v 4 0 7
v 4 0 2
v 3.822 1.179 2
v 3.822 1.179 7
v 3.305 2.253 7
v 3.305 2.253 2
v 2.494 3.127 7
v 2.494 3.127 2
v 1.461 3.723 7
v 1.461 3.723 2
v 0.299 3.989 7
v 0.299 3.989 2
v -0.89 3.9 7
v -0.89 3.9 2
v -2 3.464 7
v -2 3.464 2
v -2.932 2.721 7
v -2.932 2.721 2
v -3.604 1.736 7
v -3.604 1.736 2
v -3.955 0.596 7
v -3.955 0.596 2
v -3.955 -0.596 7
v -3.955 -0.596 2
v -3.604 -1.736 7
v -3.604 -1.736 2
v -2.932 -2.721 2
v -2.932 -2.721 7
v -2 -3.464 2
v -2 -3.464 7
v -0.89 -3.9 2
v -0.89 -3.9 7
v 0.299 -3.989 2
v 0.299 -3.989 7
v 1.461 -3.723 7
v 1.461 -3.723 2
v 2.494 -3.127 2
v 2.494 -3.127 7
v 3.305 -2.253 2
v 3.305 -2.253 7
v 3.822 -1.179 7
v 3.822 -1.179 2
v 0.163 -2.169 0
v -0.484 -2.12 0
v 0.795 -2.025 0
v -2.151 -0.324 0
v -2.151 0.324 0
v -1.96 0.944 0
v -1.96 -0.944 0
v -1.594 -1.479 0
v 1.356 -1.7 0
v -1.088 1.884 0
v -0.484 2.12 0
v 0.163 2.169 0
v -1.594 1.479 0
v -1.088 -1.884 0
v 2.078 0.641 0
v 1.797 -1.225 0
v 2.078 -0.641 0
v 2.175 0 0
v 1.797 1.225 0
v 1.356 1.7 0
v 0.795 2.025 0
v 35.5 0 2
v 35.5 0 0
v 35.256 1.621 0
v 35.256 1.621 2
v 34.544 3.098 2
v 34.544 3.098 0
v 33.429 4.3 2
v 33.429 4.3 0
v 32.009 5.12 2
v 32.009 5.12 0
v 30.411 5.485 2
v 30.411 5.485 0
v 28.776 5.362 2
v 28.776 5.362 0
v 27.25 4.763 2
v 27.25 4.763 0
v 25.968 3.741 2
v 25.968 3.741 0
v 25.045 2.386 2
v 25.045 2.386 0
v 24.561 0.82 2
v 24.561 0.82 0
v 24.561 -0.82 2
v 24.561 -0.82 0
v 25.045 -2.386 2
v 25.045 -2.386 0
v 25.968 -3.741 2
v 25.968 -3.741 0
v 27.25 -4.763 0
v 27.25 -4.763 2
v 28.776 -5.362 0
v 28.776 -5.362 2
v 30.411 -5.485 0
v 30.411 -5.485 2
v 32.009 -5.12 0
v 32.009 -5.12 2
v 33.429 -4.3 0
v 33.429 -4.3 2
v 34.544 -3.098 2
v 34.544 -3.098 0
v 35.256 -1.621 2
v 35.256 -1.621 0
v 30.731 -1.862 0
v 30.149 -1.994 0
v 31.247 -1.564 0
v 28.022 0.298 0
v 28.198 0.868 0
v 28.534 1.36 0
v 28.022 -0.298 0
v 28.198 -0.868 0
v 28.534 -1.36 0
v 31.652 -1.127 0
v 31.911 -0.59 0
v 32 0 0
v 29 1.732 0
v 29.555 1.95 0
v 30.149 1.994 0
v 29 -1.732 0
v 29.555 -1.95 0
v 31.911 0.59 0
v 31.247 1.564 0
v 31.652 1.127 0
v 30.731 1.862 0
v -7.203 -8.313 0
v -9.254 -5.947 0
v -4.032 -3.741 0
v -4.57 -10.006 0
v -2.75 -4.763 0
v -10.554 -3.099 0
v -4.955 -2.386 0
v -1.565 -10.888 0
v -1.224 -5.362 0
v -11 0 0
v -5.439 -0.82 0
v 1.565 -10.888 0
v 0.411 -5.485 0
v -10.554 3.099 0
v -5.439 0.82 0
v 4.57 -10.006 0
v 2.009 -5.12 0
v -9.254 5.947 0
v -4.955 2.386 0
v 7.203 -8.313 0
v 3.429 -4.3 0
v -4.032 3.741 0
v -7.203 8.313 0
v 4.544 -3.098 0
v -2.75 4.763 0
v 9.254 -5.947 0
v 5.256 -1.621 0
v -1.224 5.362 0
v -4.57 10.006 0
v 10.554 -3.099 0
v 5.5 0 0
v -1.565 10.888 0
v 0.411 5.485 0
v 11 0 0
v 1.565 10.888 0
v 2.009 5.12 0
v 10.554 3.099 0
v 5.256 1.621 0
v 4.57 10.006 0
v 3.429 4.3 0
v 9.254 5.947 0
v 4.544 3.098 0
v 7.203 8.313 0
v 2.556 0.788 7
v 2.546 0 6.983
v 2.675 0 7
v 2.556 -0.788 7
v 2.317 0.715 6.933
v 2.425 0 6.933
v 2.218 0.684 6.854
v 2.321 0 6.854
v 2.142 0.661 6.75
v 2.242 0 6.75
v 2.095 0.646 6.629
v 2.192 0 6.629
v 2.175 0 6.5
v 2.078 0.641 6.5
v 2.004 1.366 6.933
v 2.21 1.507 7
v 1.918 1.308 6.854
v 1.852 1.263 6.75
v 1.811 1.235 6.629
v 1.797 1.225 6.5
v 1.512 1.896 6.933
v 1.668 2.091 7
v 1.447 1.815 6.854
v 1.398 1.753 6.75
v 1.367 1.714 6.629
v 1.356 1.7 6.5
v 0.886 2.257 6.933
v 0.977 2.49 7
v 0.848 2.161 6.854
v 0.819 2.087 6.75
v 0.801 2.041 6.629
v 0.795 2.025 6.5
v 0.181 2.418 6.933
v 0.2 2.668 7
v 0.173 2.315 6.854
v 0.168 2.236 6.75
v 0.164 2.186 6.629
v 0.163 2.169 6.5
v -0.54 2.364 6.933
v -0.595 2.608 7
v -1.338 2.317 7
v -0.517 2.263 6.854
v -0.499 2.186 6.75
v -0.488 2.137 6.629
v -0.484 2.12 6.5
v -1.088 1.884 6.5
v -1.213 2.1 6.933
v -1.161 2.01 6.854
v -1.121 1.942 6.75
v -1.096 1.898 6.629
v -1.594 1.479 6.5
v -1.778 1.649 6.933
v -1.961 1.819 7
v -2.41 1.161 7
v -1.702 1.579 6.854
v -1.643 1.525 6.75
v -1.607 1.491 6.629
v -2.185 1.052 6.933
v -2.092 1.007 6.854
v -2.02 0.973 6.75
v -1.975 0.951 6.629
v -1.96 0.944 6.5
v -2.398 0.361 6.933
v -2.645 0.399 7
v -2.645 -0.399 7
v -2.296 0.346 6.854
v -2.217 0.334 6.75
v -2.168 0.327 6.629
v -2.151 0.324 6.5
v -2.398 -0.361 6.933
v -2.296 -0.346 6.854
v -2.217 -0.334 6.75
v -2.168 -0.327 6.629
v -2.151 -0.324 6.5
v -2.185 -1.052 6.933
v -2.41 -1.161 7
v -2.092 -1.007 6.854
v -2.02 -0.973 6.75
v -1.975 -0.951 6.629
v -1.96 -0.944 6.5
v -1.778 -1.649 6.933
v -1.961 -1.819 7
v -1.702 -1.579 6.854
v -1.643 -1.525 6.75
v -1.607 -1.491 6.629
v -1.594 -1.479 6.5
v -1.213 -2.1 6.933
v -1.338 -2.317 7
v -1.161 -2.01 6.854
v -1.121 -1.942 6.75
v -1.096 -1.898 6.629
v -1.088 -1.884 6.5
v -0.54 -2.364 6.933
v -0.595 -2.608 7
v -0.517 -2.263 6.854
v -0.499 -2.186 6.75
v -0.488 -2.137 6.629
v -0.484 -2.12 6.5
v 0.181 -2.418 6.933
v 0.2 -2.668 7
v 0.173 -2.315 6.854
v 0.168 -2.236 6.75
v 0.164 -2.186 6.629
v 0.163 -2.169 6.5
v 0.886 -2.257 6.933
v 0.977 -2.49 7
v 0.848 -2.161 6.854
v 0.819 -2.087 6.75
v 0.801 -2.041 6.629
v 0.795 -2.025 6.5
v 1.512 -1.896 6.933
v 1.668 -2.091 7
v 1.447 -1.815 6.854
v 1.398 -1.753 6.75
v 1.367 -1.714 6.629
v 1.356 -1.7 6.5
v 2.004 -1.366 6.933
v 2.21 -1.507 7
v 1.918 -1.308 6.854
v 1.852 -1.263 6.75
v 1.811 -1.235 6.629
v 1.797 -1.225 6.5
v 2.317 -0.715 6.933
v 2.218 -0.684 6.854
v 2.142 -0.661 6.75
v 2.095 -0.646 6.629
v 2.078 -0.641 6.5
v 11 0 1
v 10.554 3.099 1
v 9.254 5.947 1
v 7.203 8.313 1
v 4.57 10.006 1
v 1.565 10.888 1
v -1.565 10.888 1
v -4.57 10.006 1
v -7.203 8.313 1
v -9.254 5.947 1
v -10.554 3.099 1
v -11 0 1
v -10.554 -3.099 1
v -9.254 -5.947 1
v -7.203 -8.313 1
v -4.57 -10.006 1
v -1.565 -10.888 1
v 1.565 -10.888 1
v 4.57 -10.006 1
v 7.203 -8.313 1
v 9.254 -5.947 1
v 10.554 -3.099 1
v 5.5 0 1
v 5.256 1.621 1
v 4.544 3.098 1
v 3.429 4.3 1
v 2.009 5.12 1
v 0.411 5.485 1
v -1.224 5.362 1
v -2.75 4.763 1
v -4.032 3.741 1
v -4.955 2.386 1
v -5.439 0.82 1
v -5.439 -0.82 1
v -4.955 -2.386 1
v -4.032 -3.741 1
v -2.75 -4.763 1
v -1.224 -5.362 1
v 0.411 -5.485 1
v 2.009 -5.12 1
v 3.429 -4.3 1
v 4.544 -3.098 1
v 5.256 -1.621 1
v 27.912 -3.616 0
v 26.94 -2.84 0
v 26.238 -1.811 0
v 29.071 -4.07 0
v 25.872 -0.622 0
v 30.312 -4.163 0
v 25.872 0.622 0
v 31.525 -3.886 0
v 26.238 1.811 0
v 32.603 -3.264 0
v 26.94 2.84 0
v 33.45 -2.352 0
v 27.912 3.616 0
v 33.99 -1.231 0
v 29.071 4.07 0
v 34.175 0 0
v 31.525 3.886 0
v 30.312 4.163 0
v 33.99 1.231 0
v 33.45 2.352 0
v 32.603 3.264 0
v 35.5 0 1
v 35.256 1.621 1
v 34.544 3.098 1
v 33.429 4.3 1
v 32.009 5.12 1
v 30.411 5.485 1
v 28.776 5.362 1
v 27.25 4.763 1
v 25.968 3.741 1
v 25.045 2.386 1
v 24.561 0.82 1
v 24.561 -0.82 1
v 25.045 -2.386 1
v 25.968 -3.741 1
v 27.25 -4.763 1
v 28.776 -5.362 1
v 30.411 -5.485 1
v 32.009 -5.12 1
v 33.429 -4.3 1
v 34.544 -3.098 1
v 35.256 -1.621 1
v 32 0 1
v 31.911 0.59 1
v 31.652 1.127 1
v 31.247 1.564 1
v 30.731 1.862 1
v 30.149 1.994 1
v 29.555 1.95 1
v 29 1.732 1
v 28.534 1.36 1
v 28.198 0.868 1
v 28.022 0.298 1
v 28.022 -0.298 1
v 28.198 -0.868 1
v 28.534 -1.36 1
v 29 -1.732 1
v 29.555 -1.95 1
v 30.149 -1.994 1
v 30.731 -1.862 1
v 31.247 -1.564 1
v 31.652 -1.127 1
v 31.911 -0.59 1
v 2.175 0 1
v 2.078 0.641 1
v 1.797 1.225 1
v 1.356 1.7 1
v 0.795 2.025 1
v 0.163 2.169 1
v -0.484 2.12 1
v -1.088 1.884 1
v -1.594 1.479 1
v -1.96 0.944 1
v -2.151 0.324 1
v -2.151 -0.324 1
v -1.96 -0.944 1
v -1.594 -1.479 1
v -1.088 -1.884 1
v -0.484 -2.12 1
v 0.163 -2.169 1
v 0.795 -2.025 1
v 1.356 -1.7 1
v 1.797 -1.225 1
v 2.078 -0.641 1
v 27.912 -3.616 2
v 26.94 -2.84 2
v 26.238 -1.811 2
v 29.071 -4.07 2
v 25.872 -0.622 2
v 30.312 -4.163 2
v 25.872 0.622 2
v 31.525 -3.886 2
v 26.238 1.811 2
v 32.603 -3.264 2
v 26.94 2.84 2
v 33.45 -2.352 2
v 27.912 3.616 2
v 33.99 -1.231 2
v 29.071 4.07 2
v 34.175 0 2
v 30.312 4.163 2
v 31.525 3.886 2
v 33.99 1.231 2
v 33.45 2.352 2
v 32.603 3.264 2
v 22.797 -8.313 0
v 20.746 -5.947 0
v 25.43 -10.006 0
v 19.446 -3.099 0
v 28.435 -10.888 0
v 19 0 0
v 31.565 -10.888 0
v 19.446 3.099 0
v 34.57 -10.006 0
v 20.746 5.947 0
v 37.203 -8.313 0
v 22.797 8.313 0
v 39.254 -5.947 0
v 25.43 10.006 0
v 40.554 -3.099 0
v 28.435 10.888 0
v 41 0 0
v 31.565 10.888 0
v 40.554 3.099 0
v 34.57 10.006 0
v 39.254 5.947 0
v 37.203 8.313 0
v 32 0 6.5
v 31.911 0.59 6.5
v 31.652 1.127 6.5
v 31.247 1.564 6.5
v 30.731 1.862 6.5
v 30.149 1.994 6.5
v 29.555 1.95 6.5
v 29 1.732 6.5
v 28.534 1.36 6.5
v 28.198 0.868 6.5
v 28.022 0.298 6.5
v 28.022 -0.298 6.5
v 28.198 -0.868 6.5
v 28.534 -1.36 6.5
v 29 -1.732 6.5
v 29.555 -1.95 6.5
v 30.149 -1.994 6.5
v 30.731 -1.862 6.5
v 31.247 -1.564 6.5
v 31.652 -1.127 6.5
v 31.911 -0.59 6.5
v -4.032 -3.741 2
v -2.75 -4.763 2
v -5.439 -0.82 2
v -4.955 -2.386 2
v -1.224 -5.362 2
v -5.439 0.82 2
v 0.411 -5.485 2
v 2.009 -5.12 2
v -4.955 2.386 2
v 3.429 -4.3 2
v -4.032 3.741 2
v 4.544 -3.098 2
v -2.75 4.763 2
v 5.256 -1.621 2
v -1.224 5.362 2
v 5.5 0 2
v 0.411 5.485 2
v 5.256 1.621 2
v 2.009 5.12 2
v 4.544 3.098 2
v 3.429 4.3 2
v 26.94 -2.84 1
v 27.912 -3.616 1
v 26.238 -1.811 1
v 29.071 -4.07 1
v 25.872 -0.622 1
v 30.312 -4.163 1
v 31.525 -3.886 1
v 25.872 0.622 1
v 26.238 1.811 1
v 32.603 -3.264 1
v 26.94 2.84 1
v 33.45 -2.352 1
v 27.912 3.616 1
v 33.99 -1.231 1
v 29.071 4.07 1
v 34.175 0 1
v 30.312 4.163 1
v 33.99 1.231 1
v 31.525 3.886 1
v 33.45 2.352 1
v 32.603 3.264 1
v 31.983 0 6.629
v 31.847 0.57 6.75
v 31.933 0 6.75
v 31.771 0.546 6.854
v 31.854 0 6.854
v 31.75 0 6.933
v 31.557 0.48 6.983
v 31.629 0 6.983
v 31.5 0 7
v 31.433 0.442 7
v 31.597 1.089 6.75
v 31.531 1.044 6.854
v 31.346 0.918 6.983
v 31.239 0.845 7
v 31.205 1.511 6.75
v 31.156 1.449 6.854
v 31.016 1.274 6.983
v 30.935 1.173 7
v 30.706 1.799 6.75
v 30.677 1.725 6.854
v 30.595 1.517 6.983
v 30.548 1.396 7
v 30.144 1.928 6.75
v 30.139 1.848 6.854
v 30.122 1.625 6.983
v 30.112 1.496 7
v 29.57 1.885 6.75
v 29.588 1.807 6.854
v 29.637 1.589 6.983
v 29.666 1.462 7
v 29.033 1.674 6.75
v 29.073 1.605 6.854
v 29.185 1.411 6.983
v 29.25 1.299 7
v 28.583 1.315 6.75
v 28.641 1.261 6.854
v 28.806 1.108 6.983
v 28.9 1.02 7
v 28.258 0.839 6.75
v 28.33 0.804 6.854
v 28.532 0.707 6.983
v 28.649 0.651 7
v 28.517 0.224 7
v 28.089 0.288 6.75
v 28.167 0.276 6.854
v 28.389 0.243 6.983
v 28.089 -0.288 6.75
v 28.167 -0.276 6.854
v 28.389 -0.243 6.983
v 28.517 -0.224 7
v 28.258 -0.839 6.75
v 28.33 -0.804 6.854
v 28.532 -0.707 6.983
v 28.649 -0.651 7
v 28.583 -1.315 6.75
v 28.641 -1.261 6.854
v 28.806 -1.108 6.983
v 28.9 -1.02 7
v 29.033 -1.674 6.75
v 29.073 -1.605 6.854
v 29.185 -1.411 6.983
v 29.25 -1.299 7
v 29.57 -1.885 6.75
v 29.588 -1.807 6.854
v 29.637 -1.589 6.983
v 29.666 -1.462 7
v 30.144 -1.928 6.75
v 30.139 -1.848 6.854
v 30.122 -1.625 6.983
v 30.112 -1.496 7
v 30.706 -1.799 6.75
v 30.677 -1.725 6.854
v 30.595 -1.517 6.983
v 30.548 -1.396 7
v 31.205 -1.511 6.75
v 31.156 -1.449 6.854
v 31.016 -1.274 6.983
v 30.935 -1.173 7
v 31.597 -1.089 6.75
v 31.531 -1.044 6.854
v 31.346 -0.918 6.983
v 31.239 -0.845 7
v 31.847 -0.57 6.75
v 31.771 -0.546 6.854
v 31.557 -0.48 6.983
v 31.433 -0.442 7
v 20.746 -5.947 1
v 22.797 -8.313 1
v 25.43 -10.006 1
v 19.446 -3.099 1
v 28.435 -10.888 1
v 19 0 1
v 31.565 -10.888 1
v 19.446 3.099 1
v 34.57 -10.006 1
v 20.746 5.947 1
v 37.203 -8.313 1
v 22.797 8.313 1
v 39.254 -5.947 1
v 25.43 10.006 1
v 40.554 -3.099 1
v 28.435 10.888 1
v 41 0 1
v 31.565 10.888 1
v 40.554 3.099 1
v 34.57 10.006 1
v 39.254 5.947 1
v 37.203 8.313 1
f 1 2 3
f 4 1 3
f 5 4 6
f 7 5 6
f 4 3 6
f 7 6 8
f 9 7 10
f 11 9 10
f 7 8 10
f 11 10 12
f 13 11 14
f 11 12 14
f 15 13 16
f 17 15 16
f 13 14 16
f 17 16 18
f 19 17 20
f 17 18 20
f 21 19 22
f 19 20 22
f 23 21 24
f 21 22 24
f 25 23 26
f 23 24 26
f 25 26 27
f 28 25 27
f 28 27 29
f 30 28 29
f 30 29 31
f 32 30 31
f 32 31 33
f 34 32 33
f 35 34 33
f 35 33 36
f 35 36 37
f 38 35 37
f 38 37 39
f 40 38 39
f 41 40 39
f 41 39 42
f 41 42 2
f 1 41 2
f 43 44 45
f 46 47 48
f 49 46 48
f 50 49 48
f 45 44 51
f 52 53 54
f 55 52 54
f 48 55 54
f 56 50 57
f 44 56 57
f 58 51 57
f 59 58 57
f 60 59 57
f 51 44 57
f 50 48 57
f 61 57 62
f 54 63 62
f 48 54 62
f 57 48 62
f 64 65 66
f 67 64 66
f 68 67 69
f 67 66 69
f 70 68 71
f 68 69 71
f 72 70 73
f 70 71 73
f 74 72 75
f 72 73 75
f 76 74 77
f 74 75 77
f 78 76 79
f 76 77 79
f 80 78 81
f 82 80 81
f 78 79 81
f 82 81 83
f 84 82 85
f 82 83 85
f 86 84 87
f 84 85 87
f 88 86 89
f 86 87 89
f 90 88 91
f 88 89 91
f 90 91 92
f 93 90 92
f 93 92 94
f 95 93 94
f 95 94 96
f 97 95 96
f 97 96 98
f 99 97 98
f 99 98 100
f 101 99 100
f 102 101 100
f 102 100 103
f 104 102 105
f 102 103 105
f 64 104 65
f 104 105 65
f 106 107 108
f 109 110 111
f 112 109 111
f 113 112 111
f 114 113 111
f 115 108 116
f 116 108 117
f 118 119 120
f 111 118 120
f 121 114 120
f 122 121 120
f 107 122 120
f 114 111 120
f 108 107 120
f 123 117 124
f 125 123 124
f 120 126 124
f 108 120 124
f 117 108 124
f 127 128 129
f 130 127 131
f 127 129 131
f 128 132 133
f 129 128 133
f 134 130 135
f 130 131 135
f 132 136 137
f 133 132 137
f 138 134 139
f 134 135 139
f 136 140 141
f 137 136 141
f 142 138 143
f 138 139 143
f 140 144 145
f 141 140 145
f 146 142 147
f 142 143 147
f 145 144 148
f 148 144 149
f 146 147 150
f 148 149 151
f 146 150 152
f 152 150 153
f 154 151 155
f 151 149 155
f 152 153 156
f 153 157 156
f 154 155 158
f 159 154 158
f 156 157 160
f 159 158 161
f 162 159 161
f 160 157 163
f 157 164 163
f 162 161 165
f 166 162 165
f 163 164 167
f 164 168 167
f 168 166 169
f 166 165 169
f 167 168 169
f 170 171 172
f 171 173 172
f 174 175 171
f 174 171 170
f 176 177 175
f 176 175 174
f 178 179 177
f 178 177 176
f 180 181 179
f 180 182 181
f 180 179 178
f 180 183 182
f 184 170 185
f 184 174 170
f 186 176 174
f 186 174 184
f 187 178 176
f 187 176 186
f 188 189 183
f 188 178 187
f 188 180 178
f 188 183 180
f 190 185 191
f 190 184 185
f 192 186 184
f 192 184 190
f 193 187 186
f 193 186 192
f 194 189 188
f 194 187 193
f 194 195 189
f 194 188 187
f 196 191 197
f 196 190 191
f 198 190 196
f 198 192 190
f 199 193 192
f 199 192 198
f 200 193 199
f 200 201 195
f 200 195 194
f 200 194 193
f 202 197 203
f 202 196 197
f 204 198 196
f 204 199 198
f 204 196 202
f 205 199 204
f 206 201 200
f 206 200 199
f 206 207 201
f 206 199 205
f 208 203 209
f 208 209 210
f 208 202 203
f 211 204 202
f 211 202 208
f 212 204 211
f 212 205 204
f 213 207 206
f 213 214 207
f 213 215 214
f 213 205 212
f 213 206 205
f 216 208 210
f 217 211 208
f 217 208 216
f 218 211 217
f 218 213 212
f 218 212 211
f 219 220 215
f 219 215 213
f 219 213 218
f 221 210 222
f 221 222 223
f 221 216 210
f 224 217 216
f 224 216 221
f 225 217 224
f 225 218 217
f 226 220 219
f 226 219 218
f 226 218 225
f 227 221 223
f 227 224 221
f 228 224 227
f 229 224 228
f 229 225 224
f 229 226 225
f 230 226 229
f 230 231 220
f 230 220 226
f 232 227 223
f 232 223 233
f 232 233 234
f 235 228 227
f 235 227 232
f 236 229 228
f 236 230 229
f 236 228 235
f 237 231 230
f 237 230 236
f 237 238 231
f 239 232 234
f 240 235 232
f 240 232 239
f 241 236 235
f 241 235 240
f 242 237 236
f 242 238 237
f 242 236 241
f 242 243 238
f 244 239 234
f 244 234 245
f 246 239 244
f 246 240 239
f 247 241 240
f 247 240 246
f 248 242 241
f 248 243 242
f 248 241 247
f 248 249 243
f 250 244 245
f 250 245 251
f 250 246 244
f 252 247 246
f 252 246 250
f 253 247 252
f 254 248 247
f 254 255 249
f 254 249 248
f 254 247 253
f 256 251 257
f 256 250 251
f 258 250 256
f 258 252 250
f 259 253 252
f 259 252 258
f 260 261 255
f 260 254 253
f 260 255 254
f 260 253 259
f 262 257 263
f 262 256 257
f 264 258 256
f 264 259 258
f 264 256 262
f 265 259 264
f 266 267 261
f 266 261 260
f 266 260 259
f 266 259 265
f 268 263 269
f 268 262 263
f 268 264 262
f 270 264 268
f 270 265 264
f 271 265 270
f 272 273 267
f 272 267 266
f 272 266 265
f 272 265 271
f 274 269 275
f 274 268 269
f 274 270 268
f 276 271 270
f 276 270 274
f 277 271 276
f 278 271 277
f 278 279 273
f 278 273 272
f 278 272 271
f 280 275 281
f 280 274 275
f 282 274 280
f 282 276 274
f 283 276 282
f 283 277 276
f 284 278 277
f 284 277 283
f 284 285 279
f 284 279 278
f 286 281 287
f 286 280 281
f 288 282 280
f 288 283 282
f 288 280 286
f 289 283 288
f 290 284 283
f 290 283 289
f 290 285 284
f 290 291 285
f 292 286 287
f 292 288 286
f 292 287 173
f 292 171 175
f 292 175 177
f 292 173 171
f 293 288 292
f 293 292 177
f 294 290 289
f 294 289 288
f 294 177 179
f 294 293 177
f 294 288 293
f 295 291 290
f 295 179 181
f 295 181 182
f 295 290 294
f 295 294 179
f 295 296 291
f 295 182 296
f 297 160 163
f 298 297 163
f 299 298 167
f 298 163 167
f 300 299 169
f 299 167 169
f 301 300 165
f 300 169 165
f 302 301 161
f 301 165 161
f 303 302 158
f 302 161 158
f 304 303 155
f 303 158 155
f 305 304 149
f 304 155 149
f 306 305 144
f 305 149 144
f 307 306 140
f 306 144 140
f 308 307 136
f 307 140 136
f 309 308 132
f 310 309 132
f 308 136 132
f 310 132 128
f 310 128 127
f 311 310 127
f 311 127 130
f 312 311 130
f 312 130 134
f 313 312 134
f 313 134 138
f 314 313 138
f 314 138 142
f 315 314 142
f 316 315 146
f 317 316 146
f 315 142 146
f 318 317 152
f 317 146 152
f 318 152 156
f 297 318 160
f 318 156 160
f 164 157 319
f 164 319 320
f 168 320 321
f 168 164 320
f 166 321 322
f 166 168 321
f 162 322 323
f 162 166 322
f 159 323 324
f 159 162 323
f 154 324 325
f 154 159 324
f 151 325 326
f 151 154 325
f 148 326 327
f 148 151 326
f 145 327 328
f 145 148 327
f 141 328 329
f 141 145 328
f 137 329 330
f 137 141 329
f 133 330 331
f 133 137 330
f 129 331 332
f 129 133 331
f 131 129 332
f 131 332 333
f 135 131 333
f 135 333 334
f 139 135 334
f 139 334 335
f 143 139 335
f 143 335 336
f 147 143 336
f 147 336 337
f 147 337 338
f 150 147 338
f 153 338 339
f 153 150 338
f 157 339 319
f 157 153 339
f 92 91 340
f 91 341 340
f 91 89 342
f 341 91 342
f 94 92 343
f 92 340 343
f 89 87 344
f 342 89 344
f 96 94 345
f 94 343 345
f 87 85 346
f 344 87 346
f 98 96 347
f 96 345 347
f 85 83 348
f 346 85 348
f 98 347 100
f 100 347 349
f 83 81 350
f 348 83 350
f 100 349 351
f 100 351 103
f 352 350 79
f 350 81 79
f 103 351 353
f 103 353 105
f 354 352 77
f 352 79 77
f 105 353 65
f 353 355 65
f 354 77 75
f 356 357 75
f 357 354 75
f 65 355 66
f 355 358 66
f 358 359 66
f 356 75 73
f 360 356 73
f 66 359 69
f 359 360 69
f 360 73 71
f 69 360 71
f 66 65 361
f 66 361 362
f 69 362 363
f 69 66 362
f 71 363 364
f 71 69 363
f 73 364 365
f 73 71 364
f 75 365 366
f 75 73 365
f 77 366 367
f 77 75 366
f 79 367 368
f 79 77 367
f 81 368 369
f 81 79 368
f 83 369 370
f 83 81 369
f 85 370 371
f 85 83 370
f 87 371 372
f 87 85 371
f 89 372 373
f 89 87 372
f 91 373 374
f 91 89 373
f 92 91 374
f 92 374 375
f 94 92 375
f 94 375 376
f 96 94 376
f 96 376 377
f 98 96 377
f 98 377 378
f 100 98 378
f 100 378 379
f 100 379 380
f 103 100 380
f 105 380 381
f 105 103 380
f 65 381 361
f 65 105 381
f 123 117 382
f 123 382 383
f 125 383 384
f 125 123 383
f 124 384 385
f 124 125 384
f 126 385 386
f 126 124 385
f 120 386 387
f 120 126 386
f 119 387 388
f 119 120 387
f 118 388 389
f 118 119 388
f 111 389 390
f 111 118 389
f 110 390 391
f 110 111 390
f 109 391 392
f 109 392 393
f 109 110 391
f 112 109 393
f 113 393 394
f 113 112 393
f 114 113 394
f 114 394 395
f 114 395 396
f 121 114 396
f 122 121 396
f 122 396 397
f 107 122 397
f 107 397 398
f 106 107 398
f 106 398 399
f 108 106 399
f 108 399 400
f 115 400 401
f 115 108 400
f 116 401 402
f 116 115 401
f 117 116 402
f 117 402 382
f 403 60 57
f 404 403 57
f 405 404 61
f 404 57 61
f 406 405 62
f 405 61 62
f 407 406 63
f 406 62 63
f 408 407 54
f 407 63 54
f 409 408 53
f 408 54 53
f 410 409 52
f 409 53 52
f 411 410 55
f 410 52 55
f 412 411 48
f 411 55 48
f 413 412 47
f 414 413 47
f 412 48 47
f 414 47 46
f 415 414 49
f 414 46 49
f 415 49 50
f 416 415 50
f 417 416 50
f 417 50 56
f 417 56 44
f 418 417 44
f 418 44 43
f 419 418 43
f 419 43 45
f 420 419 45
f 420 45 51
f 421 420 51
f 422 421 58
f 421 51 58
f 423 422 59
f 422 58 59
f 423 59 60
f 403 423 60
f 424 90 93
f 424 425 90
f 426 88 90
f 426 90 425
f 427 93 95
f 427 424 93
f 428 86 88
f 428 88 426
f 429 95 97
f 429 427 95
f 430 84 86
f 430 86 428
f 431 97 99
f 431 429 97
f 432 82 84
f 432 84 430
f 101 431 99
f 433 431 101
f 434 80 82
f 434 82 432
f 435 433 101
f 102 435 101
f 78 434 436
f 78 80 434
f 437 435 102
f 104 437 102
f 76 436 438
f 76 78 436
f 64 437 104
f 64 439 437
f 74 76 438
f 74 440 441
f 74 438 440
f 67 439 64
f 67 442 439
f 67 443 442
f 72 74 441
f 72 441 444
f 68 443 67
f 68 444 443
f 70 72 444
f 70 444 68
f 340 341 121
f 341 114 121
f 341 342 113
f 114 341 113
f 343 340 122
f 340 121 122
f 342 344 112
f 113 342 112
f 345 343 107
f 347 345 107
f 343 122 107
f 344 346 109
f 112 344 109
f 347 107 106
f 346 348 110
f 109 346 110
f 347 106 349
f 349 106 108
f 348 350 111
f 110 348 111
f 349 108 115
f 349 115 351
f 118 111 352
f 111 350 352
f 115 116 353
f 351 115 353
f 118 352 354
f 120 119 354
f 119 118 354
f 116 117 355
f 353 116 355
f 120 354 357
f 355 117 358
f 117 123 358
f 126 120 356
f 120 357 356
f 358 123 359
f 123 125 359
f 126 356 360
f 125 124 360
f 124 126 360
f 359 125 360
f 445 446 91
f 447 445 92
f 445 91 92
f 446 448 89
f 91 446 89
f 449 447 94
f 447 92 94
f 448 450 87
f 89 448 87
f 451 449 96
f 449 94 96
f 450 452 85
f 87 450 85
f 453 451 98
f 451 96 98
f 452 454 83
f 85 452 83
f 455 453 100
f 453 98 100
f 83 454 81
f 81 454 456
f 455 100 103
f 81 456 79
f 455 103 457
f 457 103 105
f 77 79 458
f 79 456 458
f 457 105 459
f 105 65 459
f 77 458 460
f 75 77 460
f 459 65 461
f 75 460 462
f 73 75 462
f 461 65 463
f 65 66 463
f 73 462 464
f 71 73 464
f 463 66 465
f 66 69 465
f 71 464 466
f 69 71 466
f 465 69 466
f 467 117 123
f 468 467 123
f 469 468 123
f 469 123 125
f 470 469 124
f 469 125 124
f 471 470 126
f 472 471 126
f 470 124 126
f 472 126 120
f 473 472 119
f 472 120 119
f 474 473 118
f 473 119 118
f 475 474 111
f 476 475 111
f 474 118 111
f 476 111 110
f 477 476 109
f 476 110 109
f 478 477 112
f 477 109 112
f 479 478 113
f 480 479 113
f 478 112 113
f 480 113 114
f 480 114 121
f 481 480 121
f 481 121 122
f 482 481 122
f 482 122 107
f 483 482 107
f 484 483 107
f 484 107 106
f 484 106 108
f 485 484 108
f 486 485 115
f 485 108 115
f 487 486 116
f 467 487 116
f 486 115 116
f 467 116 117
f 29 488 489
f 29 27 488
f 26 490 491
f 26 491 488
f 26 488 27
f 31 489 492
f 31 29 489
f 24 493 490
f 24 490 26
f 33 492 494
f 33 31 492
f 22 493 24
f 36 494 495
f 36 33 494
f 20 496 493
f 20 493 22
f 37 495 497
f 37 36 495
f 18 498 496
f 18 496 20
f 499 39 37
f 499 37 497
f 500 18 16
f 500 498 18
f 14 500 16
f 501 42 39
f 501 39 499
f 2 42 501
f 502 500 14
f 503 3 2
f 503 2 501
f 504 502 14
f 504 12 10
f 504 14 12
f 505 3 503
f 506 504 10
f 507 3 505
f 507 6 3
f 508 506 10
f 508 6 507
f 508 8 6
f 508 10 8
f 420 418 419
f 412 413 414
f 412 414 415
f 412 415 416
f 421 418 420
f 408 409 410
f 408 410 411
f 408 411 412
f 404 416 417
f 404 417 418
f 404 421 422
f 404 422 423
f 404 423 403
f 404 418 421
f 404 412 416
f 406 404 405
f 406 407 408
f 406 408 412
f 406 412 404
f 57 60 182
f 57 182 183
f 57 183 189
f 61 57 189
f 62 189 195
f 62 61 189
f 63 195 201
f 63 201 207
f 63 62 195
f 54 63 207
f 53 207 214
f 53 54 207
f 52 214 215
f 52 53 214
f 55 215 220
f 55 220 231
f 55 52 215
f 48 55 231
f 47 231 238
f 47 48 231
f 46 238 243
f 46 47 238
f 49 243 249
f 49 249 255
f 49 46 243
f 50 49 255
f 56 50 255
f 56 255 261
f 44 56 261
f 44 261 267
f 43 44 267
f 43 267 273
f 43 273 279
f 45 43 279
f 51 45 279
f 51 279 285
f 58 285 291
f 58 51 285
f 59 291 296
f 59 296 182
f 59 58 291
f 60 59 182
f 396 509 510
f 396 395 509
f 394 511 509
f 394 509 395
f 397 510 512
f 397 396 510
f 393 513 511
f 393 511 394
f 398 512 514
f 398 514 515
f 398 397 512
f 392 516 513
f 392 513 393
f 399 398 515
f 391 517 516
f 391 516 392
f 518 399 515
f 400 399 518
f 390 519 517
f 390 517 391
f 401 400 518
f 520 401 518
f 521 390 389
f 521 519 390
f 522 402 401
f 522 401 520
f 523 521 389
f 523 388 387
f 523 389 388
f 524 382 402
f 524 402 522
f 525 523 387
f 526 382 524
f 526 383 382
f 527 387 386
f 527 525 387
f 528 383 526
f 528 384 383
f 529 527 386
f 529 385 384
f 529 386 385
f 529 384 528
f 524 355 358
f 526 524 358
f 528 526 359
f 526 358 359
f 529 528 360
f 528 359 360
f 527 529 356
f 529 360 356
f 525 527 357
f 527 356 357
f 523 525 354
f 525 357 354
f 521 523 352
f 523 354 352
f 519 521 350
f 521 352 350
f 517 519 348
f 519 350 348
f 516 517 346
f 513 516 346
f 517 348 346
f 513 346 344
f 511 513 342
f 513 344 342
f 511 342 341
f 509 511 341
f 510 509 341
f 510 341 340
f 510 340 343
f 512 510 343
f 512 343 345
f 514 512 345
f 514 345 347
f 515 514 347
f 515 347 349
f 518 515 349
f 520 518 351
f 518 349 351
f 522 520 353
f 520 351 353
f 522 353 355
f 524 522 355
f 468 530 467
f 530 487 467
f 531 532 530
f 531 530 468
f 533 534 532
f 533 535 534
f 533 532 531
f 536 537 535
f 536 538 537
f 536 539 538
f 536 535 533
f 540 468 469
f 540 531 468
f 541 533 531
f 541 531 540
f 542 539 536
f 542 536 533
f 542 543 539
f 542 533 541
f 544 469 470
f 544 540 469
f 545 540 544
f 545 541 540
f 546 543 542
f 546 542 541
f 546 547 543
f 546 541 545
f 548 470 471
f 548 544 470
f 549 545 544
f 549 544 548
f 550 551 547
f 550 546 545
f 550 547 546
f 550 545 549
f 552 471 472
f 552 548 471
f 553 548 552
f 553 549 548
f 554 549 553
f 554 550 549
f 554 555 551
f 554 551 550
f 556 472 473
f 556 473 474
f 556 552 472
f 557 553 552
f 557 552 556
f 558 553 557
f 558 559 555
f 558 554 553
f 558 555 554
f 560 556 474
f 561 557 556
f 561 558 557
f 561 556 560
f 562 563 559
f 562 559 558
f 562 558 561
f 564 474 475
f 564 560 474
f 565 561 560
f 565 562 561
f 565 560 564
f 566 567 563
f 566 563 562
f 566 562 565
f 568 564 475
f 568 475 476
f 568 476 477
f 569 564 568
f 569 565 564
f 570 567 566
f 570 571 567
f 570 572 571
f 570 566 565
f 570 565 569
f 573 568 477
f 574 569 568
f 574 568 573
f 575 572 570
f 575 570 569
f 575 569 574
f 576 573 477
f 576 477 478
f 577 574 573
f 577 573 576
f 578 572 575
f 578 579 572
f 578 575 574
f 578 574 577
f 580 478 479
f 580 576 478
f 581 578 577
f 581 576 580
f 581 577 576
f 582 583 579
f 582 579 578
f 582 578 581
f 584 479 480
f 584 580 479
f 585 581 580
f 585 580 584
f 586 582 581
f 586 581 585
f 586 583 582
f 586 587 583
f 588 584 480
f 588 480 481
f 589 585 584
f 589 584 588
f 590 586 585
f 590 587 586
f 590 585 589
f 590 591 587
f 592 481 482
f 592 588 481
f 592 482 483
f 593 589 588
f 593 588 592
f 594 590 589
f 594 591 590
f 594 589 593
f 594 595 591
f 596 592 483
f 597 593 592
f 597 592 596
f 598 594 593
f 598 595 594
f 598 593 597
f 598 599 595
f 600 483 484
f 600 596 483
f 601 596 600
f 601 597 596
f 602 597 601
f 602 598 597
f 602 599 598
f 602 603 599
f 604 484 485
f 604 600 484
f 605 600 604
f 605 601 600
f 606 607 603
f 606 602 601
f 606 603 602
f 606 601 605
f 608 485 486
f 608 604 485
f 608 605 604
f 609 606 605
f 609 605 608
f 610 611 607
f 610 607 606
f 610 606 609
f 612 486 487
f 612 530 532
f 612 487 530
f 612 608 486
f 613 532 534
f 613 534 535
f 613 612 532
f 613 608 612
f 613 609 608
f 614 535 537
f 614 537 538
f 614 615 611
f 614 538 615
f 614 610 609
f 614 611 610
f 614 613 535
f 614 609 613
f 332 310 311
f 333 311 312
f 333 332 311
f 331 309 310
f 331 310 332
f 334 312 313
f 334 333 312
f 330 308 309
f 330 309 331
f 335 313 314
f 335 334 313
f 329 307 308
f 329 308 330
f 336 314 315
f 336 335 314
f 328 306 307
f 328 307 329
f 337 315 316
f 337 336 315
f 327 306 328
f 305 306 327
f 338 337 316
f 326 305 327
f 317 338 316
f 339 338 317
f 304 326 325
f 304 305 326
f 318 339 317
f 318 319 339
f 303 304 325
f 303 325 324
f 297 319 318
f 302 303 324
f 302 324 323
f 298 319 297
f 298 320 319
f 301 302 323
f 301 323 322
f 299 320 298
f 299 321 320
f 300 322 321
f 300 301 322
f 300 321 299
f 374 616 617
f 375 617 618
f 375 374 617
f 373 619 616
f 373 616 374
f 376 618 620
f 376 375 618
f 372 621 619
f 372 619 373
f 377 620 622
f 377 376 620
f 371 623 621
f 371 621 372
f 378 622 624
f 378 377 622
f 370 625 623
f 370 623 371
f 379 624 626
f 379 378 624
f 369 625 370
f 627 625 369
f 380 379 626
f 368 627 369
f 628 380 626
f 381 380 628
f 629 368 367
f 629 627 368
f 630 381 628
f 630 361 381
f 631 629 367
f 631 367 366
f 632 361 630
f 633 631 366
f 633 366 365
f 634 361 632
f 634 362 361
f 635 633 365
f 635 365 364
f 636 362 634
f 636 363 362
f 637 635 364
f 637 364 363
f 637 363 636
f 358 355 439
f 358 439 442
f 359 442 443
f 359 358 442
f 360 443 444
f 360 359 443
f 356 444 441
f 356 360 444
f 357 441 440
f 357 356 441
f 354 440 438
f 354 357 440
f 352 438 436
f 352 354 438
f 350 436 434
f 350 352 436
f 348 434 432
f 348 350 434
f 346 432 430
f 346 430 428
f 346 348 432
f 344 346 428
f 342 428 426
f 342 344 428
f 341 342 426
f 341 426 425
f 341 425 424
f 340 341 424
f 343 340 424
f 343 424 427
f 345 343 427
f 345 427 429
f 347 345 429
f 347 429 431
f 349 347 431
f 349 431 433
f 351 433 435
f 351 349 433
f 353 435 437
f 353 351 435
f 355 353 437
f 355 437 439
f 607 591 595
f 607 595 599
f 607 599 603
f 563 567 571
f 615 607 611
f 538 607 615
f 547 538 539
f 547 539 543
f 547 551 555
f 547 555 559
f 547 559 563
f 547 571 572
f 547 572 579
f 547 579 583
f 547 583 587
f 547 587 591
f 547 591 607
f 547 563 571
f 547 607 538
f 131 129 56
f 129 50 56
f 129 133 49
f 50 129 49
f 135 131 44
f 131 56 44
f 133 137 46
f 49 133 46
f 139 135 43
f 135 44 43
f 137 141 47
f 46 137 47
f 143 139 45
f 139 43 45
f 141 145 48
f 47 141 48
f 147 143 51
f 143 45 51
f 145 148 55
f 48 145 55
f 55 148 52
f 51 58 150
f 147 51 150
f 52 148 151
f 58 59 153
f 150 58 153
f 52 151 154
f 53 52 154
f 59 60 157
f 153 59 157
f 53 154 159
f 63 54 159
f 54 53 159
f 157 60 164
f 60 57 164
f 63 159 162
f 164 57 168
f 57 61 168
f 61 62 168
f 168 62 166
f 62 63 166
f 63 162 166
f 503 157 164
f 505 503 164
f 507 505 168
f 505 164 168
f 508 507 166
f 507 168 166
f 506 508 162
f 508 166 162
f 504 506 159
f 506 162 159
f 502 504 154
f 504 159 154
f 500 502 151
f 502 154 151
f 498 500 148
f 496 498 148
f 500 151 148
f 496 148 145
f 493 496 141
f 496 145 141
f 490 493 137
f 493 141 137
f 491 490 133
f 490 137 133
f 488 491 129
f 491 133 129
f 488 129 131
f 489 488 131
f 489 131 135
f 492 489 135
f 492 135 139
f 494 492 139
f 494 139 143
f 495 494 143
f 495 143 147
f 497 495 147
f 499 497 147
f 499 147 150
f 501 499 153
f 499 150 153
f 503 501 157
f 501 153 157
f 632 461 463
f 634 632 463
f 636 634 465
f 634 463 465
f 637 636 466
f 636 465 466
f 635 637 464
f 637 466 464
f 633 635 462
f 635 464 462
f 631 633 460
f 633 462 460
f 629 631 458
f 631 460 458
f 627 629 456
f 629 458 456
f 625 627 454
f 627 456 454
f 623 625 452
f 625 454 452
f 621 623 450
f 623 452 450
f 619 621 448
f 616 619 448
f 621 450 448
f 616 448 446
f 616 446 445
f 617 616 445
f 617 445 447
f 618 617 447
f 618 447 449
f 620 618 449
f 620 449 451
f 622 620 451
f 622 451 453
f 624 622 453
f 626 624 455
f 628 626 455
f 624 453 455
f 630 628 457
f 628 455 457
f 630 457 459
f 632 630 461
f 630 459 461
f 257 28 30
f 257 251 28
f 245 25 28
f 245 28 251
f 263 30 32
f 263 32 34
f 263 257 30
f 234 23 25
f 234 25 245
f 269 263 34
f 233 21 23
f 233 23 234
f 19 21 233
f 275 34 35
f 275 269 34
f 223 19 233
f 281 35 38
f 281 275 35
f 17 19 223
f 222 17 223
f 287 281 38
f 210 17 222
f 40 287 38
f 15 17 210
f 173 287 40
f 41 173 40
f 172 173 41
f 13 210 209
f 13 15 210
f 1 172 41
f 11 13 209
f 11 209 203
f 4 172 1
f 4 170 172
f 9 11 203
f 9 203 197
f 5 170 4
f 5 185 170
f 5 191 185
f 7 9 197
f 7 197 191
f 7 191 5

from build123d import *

# Parameters (mm, degrees)
F0_R     = 11
F0_R_2   = 5.5
F1_DEPTH = 1
F0_R_3   = 4
F0_R_4   = 4.175
F2_DEPTH = 2
F0_R_5   = 2.175
F0_R_6   = 2
F3_DEPTH = 7
F4_DEPTH = 1
F5_R     = 0.5


with BuildPart() as f1:
    # F0 (on Top) → F1 (new body)
    with BuildSketch(Plane.XY):
        Circle(F0_R)
        Circle(F0_R_2, mode=Mode.SUBTRACT)
        with Locations((30, 0)):
            Circle(F0_R)
        with Locations((30, 0)):
            Circle(F0_R_2, mode=Mode.SUBTRACT)
    extrude(amount=F1_DEPTH)


with BuildPart() as f2:
    # F0 (on Top) → F2 (new body)
    with BuildSketch(Plane.XY):
        Circle(F0_R_2)
        Circle(F0_R_3, mode=Mode.SUBTRACT)
        with Locations((30, 0)):
            Circle(F0_R_2)
        with Locations((30, 0)):
            Circle(F0_R_4, mode=Mode.SUBTRACT)
    extrude(amount=F2_DEPTH)

    # F0 (on Top) → F3 (join)
    with BuildSketch(Plane.XY):
        Circle(F0_R_3)
        Circle(F0_R_5, mode=Mode.SUBTRACT)
        with Locations((30, 0)):
            Circle(F0_R_6)
    extrude(amount=F3_DEPTH)

    # F5
    f5_edges = [f2.edges().sort_by_distance(p)[0] for p in [
        (28, 0, 7),
        (-2.175, 0, 7),
    ]]
    fillet(f5_edges, radius=F5_R)


with BuildPart() as f4:
    # F0 (on Top) → F4 (new body)
    with BuildSketch(Plane.XY):
        with Locations((30, 0)):
            Circle(F0_R_4)
        with Locations((30, 0)):
            Circle(F0_R_6, mode=Mode.SUBTRACT)
        Circle(F0_R_5)
    extrude(amount=F4_DEPTH)


solid = Compound([f1.part, f2.part, f4.part])
